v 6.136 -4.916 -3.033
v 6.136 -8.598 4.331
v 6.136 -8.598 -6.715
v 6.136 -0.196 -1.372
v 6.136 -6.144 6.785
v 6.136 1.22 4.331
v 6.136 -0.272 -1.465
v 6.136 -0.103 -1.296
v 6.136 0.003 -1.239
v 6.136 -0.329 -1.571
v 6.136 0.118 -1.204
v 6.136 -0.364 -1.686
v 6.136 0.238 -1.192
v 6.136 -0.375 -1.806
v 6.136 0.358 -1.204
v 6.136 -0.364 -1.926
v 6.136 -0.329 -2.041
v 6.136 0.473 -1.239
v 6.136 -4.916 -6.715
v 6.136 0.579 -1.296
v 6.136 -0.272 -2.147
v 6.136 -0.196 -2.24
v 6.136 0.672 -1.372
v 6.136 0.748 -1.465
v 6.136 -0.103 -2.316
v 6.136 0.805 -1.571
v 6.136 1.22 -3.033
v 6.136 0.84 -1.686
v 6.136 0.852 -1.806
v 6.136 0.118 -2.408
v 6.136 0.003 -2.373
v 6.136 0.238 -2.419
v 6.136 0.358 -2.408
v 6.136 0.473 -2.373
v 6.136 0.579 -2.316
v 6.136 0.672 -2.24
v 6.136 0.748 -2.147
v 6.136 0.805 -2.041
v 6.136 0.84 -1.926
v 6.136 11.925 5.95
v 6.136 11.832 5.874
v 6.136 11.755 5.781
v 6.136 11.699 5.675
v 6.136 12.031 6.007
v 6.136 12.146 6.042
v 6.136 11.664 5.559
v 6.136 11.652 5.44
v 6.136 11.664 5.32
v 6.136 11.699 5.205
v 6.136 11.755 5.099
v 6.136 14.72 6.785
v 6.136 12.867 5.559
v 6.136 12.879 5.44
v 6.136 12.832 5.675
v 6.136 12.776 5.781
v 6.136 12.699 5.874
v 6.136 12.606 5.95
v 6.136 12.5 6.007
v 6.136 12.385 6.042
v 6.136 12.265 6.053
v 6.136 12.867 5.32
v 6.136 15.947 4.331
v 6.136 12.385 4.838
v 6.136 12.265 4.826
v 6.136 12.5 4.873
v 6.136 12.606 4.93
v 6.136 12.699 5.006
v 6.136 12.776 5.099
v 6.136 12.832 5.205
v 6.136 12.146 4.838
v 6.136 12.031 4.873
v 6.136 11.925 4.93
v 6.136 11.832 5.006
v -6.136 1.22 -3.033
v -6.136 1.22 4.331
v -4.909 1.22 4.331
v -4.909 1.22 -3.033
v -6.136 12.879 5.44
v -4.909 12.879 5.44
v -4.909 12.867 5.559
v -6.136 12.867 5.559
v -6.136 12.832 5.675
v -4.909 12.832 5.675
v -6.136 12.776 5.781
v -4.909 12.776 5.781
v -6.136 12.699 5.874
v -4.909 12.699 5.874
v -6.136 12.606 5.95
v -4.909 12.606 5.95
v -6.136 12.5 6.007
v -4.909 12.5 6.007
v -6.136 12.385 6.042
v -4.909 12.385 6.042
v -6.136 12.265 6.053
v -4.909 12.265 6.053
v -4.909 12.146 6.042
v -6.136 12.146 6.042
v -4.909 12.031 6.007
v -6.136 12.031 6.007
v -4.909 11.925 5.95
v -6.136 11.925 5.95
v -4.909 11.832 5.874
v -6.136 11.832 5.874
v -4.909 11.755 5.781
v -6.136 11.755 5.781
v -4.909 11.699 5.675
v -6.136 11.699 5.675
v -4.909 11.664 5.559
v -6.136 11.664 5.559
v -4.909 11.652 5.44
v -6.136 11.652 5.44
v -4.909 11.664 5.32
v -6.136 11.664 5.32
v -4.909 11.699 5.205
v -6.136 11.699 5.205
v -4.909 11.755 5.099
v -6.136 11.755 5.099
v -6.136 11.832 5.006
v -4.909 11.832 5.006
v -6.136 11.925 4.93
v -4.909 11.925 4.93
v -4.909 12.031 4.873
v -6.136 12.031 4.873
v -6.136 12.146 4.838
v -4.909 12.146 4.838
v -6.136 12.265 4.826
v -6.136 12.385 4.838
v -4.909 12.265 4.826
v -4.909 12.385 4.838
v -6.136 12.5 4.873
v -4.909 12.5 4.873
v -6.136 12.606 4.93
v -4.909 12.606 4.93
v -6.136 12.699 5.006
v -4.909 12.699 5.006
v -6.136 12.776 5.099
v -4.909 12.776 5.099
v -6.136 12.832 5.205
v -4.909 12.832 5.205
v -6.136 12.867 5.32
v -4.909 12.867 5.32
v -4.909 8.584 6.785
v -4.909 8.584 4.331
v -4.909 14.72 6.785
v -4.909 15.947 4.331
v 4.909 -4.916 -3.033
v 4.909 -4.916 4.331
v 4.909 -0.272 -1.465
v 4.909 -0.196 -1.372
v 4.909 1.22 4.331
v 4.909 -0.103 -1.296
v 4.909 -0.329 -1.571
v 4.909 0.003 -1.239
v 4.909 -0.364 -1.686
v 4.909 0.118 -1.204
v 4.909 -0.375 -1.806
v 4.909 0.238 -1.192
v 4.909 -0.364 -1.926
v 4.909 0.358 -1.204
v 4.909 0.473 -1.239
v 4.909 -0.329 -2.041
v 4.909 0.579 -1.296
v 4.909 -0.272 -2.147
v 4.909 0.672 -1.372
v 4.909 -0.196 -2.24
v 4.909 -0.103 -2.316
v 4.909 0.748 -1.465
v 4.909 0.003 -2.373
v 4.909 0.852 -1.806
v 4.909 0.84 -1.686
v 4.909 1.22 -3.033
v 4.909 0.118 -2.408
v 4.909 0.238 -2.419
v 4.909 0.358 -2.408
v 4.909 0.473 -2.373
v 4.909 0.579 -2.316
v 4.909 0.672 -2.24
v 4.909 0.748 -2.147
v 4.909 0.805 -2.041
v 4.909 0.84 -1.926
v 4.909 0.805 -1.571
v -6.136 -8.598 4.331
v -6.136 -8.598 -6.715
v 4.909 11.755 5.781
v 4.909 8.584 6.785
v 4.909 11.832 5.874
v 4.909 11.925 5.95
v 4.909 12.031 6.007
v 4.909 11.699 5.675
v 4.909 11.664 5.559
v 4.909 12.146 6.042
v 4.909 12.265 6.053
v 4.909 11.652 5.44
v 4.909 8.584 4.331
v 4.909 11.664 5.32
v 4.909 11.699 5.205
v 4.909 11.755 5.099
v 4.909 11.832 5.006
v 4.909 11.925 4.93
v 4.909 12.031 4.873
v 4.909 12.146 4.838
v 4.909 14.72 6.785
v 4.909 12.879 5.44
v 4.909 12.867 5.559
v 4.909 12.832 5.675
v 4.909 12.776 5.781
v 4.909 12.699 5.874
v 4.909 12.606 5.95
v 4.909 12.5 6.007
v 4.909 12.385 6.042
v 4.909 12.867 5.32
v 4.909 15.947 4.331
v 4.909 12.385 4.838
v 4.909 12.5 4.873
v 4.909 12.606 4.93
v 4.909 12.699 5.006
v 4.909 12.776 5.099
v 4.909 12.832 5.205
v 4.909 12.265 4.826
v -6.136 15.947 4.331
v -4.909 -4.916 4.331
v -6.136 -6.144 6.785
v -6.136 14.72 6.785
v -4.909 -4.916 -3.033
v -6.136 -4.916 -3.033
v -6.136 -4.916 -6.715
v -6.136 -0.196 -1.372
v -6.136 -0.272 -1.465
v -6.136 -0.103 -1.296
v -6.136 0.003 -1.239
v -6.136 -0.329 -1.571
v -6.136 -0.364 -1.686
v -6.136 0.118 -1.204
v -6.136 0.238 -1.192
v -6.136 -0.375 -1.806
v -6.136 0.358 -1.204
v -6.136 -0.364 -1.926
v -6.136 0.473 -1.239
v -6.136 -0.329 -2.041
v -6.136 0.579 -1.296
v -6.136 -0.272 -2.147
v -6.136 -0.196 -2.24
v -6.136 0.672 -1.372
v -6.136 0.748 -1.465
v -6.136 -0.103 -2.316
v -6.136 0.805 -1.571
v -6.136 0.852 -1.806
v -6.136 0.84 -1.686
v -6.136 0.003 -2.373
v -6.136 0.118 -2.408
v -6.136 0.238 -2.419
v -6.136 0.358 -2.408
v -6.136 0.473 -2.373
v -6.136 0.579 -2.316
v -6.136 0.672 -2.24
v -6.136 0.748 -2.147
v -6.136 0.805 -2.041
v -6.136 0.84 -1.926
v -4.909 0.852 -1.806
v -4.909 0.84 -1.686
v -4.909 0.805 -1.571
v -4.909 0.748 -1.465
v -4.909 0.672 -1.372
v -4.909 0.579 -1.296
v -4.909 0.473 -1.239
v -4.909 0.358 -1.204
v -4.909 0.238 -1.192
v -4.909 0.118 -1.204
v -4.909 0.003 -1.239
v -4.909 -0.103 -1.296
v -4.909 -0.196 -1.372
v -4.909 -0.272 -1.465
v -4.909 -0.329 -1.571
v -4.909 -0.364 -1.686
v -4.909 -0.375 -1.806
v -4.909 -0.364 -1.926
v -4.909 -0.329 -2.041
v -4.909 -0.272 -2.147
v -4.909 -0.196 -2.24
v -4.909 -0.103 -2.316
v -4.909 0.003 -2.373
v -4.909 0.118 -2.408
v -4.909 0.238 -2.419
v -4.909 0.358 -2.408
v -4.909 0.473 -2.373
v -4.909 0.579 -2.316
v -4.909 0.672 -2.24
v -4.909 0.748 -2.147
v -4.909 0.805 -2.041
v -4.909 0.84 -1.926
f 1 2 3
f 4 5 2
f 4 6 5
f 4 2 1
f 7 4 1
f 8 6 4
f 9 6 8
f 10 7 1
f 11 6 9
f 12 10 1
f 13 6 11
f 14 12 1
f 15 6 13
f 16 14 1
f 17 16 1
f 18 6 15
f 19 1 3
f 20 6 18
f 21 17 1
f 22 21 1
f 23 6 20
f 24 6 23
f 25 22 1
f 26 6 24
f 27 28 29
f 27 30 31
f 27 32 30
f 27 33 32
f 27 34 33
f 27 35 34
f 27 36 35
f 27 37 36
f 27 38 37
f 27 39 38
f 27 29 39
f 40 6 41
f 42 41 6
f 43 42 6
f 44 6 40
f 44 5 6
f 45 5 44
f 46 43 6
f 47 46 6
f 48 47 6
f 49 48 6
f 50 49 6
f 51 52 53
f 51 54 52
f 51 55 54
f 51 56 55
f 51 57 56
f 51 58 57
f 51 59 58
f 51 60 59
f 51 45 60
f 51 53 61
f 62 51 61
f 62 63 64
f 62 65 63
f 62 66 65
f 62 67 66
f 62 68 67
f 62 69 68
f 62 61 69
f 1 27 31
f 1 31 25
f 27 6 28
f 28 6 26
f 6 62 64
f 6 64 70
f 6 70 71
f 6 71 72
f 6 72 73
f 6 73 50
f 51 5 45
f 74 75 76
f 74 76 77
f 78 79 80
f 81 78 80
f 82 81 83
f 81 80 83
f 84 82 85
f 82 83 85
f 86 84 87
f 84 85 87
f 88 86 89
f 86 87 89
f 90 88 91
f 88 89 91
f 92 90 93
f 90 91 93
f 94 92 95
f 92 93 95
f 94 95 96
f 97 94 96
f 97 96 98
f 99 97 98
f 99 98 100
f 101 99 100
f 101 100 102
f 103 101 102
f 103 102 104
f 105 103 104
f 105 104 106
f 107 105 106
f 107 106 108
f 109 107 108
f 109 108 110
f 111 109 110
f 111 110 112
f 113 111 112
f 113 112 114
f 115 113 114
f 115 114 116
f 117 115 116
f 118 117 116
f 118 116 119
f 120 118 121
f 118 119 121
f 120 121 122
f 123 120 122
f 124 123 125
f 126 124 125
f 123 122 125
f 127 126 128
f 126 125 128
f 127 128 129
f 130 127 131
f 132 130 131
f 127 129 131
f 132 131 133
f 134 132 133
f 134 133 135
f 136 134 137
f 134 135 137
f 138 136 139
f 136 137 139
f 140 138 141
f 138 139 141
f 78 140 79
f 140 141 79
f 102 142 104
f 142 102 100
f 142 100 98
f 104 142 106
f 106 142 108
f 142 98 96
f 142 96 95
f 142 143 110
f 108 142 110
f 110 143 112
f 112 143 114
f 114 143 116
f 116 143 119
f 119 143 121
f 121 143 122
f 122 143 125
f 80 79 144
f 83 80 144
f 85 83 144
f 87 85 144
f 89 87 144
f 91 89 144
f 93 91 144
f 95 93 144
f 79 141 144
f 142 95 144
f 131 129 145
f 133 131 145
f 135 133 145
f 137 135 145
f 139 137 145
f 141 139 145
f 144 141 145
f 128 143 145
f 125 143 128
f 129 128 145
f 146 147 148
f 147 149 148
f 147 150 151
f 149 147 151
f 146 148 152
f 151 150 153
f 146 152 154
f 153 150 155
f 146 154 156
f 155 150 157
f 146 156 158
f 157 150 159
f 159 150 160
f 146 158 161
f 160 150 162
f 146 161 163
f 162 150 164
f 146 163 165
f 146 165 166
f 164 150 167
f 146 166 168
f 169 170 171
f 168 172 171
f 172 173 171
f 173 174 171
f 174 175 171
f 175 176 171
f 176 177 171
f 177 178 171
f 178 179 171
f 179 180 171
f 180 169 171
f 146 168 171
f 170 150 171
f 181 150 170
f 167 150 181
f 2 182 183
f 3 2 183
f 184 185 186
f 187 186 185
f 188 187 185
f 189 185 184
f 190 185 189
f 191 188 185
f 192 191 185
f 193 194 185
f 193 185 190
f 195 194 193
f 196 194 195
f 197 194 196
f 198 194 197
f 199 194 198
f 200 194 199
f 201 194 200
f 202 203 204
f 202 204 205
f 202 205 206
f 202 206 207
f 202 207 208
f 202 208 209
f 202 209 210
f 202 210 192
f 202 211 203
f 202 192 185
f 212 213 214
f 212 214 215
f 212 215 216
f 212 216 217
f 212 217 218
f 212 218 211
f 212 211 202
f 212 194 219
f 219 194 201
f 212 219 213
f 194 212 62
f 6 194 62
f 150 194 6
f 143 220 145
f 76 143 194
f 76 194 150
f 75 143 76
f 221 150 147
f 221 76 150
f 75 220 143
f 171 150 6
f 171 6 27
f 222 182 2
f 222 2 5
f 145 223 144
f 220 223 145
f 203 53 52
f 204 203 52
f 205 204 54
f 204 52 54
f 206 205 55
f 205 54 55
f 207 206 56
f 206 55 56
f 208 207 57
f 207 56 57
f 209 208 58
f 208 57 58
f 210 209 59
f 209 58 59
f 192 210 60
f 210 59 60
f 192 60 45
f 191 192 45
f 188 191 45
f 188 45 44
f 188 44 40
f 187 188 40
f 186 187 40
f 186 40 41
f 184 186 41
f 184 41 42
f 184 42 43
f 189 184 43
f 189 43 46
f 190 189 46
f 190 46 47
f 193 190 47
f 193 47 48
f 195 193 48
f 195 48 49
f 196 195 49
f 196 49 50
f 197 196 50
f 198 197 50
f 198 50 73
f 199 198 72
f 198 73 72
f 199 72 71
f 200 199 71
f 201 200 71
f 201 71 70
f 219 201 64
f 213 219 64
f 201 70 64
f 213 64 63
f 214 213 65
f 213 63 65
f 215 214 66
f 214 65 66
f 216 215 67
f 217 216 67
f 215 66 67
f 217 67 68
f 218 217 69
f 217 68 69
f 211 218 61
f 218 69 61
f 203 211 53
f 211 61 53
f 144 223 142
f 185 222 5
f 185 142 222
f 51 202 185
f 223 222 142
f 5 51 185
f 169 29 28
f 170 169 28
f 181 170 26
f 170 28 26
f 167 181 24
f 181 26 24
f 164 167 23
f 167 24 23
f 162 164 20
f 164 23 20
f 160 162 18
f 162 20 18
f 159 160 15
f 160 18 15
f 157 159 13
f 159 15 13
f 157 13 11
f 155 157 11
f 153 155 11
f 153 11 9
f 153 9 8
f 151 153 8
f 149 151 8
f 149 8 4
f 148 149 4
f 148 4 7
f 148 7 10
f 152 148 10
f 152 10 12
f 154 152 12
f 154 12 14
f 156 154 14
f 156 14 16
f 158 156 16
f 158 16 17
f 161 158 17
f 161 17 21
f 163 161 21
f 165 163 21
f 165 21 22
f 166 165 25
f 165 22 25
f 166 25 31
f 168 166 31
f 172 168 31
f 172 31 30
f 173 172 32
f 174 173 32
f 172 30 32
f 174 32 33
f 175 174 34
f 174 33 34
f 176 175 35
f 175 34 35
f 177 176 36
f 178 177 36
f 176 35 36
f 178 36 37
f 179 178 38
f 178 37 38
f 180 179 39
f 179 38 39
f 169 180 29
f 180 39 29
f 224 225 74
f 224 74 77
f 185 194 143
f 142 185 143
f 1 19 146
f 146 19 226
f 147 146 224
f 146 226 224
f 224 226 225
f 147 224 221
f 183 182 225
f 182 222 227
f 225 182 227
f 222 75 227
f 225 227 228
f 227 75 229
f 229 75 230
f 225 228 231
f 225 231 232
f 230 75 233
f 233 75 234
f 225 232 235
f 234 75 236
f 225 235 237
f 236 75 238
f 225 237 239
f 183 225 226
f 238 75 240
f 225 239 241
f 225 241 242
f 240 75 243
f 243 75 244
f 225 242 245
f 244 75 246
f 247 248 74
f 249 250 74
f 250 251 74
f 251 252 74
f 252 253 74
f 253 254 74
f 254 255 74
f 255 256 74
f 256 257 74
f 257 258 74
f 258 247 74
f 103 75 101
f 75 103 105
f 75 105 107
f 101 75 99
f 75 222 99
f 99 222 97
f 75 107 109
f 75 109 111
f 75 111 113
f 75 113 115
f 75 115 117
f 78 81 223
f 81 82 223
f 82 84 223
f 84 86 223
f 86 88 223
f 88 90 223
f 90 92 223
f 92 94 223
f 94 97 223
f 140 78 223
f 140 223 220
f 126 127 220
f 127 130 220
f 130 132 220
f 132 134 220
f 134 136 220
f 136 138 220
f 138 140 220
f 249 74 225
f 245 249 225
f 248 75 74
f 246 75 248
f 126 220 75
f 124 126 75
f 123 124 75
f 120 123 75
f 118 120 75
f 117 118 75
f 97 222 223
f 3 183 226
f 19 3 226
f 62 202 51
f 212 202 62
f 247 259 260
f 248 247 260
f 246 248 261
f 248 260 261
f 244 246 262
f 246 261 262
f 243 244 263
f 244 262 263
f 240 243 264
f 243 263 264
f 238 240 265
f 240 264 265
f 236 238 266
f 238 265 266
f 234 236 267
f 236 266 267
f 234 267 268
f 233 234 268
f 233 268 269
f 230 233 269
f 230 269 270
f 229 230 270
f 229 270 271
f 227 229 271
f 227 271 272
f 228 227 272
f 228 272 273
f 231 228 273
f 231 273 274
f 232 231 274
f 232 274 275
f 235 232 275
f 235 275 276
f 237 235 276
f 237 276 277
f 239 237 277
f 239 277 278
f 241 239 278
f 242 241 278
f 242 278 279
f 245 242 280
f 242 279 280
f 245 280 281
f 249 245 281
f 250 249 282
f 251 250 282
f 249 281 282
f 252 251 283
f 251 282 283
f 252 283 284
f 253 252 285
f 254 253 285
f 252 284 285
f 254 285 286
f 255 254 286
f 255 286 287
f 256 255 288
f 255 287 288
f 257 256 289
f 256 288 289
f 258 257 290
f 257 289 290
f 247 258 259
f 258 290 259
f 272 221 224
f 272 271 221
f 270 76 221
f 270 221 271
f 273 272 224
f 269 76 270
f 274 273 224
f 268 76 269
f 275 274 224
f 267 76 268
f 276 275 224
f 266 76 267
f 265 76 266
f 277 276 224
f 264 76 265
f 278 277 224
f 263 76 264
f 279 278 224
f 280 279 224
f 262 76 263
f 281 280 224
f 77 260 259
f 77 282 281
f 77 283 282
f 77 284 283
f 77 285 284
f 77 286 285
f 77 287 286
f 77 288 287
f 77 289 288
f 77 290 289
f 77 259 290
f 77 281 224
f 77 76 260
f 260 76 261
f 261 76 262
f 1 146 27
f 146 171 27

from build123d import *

# Parameters (mm, degrees)
SKETCH_1_W                = 5
SKETCH_1_H                = 10
EXTRUDE_1_DEPTH           = 4
CUT_EXTRUDE_1_DEPTH       = 9.124038405
CUT_EXTRUDE_1_DEPTH_BACK  = 9.124038405
CUT_EXTRUDE_2_DEPTH       = 9.124038405
CUT_EXTRUDE_2_DEPTH_BACK  = 9.124038405
SKETCH_6_W                = 4
SKETCH_6_H                = 3
CUT_EXTRUDE_3_DEPTH       = 2.5
SKETCH_7_W                = 4
SKETCH_7_H                = 3
CUT_EXTRUDE_4_DEPTH       = 2.5
CUT_EXTRUDE_5_DEPTH       = 9.124038405
CUT_EXTRUDE_5_DEPTH_BACK  = 9.124038405
CUT_EXTRUDE_10_DEPTH      = 9.124038405
CUT_EXTRUDE_10_DEPTH_BACK = 5
SKETCH_11_R               = 0.25
CUT_EXTRUDE_11_DEPTH      = 5
SKETCH_12_R               = 0.25
CUT_EXTRUDE_12_DEPTH      = 5
EXTRUDE_3_DEPTH           = 5
SCALE_1_SCALE             = 2.454545455


with BuildPart() as part:
    # 草图1 → 凸台-拉伸1 (new body)
    with BuildSketch(Plane.XY):
        Rectangle(SKETCH_1_W, SKETCH_1_H)
    extrude(amount=EXTRUDE_1_DEPTH)

    # 草图2 → 切除-拉伸1 (cut, two sides: drawn at the far end of the back side and taken through both)
    with BuildSketch(Plane(origin=(2.5, 0, 0), x_dir=(0, 0, -1), z_dir=(1, 0, 0)).offset(-CUT_EXTRUDE_1_DEPTH_BACK)):
        Polygon((-31.620459958, -9.310229979), (-4, 4.5), (-3, 5), (24.620459958, 18.810229979), (-3, 74.051149895), (-59.240919916, 45.930689937), align=None)
    extrude(amount=CUT_EXTRUDE_1_DEPTH + CUT_EXTRUDE_1_DEPTH_BACK, mode=Mode.SUBTRACT)

    # 草图3 → 切除-拉伸2 (cut, two sides: drawn at the far end of the back side and taken through both)
    with BuildSketch(Plane(origin=(2.5, 0, 0), x_dir=(0, 0, -1), z_dir=(1, 0, 0)).offset(-CUT_EXTRUDE_2_DEPTH_BACK)):
        Polygon((-3, 35.880613018), (-3, 5), (-3, -1), (0, -1), (30.880613018, -1), (76.363050598, 40.782734631), (42.48243758, 77.663347649), align=None)
    extrude(amount=CUT_EXTRUDE_2_DEPTH + CUT_EXTRUDE_2_DEPTH_BACK, mode=Mode.SUBTRACT)

    # 草图6 → 切除-拉伸3 (cut)
    with BuildSketch(Plane(origin=(0, -1, 0), x_dir=(1, 0, 0), z_dir=(0, 1, 0))):
        with Locations((0, -1.5)):
            Rectangle(SKETCH_6_W, SKETCH_6_H)
    extrude(amount=-CUT_EXTRUDE_3_DEPTH, mode=Mode.SUBTRACT)

    # 草图7 → 切除-拉伸4 (cut)
    with BuildSketch(Plane(origin=(0, 0, 3), x_dir=(-1, 0, 0), z_dir=(0, 0, -1))):
        with Locations((0, 3.5)):
            Rectangle(SKETCH_7_W, SKETCH_7_H)
    extrude(amount=-CUT_EXTRUDE_4_DEPTH, mode=Mode.SUBTRACT)

    # 草图8 → 切除-拉伸5 (cut, two sides: drawn at the far end of the back side and taken through both)
    with BuildSketch(Plane(origin=(2.5, 0, 0), x_dir=(0, 0, -1), z_dir=(1, 0, 0)).offset(-CUT_EXTRUDE_5_DEPTH_BACK)):
        Polygon((-25.835890872, 17.835890872), (-4, -4), (-3, -5), (18.835890872, -26.835890872), (-24.835890872, -70.507672616), (-69.507672616, -25.835890872), align=None)
    extrude(amount=CUT_EXTRUDE_5_DEPTH + CUT_EXTRUDE_5_DEPTH_BACK, mode=Mode.SUBTRACT)

    # 草图9 → 切除-拉伸10 (cut, two sides: drawn at the far end of the back side and taken through both)
    with BuildSketch(Plane(origin=(2.5, 0, 0), x_dir=(0, 0, -1), z_dir=(1, 0, 0)).offset(-CUT_EXTRUDE_10_DEPTH_BACK)):
        Polygon((-23.148447549, -26.648447549), (-1.5, -5), (0, -3.5), (21.648447549, 18.148447549), (64.945342647, -25.148447549), (20.148447549, -69.945342647), align=None)
    extrude(amount=CUT_EXTRUDE_10_DEPTH + CUT_EXTRUDE_10_DEPTH_BACK, mode=Mode.SUBTRACT)

    # 草图11 → 切除-拉伸11 (cut)
    with BuildSketch(Plane(origin=(2.5, 0, 0), x_dir=(0, 0, -1), z_dir=(1, 0, 0))):
        with Locations((-3.451895846, 3.5)):
            Circle(SKETCH_11_R)
    extrude(amount=-CUT_EXTRUDE_11_DEPTH, mode=Mode.SUBTRACT)

    # 草图12 → 切除-拉伸12 (cut)
    with BuildSketch(Plane(origin=(2.5, 0, 0), x_dir=(0, 0, -1), z_dir=(1, 0, 0))):
        with Locations((-0.5, -1.4)):
            Circle(SKETCH_12_R)
    extrude(amount=-CUT_EXTRUDE_12_DEPTH, mode=Mode.SUBTRACT)

    # 草图14 → 凸台-拉伸3 (add)
    with BuildSketch(Plane.ZY.offset(2.5)):
        Polygon((1.5, -5), (-1.5, -5), (-1.5, -3.5), (0, -3.5), align=None)
    extrude(amount=-EXTRUDE_3_DEPTH)


with BuildPart() as part_1:
    # 缩放比例1: scaled about (0, -2.526255673, 2.085256103)
    add(part.part.scale(SCALE_1_SCALE).moved(Location((0, 3.674553706, -3.033099786))))


solid = part_1.part
